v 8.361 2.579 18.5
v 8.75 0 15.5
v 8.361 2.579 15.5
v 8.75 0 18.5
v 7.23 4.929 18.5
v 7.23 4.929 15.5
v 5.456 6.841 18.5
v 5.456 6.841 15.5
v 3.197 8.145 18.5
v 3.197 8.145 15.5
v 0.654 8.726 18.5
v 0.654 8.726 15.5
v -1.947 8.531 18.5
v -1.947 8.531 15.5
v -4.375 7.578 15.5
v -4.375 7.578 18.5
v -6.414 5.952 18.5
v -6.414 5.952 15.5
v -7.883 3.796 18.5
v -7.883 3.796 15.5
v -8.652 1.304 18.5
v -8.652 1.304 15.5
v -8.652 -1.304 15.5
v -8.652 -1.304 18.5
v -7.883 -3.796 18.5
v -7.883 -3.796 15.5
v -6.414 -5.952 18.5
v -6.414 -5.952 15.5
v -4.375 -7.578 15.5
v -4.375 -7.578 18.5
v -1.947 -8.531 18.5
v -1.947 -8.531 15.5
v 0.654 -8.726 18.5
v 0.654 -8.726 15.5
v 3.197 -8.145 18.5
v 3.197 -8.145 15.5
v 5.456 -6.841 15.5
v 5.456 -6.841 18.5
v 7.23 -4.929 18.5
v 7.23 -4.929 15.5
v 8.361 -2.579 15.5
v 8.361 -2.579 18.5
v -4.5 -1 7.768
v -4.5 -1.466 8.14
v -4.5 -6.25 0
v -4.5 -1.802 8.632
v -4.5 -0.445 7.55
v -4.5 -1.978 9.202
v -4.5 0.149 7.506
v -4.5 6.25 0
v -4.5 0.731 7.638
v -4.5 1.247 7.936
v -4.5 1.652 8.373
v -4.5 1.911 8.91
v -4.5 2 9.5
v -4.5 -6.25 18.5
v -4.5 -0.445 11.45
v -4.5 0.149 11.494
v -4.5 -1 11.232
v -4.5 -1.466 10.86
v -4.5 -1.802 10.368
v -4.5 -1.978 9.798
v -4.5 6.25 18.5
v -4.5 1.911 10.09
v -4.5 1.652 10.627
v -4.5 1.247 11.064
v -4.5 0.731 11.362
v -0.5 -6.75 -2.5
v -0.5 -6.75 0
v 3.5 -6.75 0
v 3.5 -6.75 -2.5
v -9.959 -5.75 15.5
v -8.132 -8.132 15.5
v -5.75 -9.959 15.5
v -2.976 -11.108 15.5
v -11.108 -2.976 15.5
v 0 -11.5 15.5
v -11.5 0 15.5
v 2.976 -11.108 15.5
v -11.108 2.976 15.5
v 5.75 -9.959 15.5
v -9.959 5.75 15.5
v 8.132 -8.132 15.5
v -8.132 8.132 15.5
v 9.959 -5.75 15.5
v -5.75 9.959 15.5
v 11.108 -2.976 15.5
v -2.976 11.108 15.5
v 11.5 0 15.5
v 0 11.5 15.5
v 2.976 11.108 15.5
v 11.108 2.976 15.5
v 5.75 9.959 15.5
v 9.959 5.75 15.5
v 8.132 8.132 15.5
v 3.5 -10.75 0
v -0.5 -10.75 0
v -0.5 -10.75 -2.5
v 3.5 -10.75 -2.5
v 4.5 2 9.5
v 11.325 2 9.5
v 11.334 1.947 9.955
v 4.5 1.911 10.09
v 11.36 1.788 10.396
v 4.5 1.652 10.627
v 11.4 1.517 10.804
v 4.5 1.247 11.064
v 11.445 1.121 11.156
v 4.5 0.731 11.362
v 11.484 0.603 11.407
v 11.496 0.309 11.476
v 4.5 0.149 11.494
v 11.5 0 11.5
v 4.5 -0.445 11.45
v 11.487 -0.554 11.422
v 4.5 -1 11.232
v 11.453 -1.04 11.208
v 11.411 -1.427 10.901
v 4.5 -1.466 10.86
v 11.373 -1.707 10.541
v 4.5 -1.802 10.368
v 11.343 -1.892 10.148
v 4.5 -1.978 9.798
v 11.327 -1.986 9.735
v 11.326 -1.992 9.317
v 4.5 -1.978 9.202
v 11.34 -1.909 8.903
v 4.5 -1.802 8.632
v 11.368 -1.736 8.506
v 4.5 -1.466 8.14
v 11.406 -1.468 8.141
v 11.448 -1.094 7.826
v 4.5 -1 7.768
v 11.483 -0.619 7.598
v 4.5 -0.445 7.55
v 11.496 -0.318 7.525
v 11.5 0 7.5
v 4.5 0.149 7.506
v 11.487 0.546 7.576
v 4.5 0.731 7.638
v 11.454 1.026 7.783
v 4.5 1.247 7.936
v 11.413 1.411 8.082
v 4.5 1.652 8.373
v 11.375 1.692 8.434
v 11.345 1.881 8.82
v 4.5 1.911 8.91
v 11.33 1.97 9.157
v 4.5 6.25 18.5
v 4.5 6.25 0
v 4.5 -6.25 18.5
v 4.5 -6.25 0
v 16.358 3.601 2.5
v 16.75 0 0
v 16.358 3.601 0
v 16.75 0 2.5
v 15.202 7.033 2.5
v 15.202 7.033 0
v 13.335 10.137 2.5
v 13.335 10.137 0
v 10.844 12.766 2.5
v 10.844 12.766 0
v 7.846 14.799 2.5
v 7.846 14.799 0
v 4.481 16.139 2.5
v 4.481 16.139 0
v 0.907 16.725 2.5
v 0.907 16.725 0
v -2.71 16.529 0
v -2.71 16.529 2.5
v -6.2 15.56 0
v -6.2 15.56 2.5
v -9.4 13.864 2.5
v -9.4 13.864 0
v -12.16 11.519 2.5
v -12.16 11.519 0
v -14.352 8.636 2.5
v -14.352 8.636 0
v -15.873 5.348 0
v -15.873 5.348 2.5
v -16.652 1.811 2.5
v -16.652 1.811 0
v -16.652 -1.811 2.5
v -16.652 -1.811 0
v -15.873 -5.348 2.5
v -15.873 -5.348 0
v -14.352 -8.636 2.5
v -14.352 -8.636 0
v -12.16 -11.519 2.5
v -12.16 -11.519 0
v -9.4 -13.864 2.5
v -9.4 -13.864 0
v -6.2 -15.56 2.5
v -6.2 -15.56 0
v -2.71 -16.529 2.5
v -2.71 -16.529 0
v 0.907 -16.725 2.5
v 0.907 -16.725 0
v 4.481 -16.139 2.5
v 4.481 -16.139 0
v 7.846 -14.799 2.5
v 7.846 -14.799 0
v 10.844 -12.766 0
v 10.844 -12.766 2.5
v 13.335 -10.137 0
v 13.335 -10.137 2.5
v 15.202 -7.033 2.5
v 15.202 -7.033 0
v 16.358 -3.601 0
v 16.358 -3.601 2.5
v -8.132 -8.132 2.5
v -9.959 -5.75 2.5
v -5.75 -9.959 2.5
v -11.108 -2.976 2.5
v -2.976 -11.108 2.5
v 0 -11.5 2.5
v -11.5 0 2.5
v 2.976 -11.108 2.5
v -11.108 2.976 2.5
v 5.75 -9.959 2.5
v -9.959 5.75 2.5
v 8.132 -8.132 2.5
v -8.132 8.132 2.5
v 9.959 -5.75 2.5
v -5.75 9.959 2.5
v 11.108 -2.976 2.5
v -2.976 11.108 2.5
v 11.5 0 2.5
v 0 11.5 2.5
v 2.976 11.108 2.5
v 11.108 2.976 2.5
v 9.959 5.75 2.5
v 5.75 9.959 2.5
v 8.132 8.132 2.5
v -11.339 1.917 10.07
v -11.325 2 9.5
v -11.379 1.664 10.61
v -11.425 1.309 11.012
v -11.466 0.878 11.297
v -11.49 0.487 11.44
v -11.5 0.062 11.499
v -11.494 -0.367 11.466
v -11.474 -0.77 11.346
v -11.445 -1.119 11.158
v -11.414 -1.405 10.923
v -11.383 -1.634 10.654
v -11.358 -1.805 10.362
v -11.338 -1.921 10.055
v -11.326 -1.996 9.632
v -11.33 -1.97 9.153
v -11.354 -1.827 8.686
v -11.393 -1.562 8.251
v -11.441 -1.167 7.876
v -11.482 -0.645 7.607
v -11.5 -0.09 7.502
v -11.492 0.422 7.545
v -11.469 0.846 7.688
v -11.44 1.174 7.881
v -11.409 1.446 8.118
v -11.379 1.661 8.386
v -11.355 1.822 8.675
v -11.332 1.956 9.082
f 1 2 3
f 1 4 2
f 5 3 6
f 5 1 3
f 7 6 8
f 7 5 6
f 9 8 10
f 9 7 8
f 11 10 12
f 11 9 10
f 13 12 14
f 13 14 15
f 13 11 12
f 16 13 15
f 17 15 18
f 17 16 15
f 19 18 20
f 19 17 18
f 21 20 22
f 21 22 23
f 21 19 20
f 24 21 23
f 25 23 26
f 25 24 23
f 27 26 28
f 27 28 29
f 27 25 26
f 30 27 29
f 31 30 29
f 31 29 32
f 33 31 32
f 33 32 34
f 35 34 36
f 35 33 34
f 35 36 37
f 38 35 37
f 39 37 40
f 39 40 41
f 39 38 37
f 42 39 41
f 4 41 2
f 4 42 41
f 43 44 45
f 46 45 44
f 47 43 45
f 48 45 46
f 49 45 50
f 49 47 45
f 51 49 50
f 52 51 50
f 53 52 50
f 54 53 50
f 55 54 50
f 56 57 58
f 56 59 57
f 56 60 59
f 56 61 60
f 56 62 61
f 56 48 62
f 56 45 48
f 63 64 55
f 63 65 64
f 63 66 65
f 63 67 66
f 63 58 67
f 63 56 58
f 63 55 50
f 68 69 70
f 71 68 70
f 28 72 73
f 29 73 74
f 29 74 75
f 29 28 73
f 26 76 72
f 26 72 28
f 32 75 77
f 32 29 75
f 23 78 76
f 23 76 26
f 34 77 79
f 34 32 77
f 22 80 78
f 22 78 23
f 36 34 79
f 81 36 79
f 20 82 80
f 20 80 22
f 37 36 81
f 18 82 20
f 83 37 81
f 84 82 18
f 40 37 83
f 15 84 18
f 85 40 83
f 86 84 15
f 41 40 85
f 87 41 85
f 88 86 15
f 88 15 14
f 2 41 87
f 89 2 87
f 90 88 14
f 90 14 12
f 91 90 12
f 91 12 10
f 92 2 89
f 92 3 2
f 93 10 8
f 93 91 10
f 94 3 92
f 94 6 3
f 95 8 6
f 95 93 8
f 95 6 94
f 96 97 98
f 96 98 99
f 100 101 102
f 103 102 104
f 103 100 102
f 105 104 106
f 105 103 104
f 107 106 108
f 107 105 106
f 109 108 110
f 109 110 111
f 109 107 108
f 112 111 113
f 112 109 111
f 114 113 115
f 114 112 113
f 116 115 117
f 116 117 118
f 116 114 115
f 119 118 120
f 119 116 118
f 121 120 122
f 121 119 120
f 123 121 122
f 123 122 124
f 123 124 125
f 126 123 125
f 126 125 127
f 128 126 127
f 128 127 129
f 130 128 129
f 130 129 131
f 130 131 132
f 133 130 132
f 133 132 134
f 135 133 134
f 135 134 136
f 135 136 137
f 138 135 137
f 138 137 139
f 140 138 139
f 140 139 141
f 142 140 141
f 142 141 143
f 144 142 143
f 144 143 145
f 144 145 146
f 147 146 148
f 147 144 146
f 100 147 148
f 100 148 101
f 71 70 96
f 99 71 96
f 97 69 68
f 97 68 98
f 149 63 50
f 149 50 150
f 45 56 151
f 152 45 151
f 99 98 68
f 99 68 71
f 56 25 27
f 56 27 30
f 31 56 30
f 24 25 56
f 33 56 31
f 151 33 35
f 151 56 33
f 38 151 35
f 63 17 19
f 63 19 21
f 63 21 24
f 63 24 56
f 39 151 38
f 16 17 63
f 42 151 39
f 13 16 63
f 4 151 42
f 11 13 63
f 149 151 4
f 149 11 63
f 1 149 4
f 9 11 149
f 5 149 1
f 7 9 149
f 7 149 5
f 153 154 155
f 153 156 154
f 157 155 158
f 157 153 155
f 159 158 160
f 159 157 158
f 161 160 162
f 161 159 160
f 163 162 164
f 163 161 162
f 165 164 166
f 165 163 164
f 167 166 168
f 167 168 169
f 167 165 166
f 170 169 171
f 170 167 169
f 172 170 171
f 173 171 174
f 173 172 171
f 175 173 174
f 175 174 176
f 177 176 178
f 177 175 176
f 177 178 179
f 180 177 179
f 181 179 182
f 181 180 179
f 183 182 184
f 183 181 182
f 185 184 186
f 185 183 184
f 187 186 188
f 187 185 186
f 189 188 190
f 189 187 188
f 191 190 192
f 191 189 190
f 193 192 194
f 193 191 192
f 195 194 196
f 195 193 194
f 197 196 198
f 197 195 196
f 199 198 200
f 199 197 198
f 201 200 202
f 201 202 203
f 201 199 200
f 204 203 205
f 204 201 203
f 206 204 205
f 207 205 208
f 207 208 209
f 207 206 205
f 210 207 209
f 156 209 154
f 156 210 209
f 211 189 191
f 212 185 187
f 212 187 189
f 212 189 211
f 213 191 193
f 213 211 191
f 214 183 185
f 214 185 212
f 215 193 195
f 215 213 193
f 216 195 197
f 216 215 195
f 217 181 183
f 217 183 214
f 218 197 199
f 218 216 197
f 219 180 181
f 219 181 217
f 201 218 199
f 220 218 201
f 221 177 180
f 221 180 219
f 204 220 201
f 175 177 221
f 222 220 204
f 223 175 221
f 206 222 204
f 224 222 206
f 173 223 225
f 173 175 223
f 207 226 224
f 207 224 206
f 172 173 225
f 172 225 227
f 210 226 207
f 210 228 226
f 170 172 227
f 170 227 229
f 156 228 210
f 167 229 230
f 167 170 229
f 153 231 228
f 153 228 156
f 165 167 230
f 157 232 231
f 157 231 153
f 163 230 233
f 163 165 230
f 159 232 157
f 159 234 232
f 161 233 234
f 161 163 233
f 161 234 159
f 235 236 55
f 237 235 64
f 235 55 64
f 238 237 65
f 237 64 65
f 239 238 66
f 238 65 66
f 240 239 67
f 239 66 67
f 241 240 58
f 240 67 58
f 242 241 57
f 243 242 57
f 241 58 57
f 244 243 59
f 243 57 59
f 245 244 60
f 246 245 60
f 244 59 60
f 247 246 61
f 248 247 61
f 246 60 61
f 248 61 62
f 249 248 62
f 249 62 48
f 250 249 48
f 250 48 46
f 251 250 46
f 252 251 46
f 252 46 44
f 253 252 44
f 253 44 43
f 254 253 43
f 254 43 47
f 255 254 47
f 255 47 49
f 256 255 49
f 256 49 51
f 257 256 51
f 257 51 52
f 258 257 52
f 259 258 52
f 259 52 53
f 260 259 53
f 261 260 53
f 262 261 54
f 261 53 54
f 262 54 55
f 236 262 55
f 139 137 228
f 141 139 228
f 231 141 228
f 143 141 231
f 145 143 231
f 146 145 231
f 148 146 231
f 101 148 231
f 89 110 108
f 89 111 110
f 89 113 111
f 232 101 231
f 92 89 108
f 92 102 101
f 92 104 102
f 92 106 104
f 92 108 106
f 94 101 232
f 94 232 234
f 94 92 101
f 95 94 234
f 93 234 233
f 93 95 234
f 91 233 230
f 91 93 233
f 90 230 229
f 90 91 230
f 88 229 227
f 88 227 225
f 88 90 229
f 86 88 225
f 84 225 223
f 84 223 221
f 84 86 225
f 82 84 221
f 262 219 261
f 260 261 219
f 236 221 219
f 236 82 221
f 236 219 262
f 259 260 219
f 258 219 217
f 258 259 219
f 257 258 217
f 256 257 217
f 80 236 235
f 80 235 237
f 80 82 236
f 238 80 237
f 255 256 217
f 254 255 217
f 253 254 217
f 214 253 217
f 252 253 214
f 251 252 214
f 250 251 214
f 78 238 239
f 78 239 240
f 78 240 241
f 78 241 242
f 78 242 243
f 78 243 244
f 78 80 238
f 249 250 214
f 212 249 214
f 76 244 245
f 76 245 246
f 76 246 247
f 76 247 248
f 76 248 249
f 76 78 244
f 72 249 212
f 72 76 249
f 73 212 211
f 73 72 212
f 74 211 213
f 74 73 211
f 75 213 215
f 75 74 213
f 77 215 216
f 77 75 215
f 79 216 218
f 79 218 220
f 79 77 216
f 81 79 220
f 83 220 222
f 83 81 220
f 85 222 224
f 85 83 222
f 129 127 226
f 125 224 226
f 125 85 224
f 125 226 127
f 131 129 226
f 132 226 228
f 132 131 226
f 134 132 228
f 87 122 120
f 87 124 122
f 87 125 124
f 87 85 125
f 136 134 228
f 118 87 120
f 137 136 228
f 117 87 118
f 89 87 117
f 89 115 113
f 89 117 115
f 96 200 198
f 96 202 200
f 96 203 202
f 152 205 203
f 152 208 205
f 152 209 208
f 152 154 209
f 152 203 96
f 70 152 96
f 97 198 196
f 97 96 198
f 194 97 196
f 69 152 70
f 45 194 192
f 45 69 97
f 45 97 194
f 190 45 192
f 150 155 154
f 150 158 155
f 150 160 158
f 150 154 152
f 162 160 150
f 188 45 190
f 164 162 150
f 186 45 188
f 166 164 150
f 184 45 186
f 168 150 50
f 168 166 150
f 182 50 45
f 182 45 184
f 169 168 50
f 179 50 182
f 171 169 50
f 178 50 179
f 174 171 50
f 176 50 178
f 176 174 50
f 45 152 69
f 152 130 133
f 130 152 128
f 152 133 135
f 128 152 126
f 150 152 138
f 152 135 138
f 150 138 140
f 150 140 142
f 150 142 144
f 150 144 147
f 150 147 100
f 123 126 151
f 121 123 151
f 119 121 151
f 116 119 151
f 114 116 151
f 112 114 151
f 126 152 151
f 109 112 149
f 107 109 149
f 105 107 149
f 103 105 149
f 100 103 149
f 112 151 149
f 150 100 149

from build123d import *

# Parameters (mm, degrees)
F2_W          = 9
F2_H          = 12.5
F3_DEPTH      = 18.5
F4_W          = 4
F4_H          = 4
F5_DEPTH      = 2.5
F6_R          = 2
F7_DEPTH      = 16.751
F7_DEPTH_BACK = 16.751


with BuildPart() as f1:
    # F0 (on Front) → F1 (revolve)
    with BuildSketch(Plane.XZ):
        Polygon((0, 18.5), (0, 0), (16.75, 0), (16.75, 2.5), (11.5, 2.5), (11.5, 15.5), (8.75, 15.5), (8.75, 18.5), align=None)
    revolve(axis=Axis((0, 0, 44.9704285987), (0, 0, 1)))

    # F2 (on face) → F3 (cut, through all)
    with BuildSketch(Plane.XY.offset(18.5)):
        Rectangle(F2_W, F2_H)
    extrude(amount=-F3_DEPTH, mode=Mode.SUBTRACT)

    # F4 (on face) → F5 (join)
    with BuildSketch(Plane(origin=(0, 0, 0), x_dir=(1, 0, 0), z_dir=(0, 0, -1))):
        with Locations((1.5, 8.75)):
            Rectangle(F4_W, F4_H)
    extrude(amount=F5_DEPTH)

    # F6 (on Right) → F7 (cut, two sides)
    with BuildSketch(Plane.YZ) as f7_sk:
        with Locations((0, 9.5)):
            Circle(F6_R)
    extrude(amount=-F7_DEPTH, mode=Mode.SUBTRACT)
    extrude(f7_sk.sketch, amount=F7_DEPTH_BACK, mode=Mode.SUBTRACT)


solid = f1.part
